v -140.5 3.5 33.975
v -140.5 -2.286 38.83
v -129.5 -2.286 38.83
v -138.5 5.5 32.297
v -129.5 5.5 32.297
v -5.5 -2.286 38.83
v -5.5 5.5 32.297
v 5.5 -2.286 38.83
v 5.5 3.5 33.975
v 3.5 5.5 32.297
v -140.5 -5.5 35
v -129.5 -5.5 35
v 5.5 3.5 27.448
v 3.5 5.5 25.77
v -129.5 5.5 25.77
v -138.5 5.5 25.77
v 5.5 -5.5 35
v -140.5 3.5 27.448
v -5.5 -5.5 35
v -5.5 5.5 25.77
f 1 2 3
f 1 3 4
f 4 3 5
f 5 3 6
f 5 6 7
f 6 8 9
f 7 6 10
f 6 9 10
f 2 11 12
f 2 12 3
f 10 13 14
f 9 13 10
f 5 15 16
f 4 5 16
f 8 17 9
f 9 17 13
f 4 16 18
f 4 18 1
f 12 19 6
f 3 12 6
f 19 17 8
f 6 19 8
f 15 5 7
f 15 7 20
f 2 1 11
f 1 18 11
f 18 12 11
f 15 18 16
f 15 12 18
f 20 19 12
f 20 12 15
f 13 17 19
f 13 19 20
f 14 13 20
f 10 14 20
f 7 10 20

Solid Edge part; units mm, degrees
sketch "Sketch1" plane through (0, 0, 0) normal (0, 0, 1) x (1, 0, 0)
  line L0 (-140.5, -5.5) -> (-129.5, -5.5)
  line L1 (-129.5, -5.5) -> (-129.5, 5.5)
  line L2 (-129.5, 5.5) -> (-140.5, 5.5)
  line L3 (-140.5, 5.5) -> (-140.5, -5.5)
  line L4 (-5.5, -5.5) -> (5.5, -5.5)
  line L5 (5.5, -5.5) -> (5.5, 5.5)
  line L6 (5.5, 5.5) -> (-5.5, 5.5)
  line L7 (-5.5, 5.5) -> (-5.5, -5.5)
extrude "ExtrudedProtrusion_1" add sketch "Sketch1" along normal blind 35
sketch "Sketch2" plane through (-129.5, 0, 17.5) normal (1, 0, 0) x (0, 1, 0)
  line L0 (-5.5, 17.5) -> (5.5, 8.2699)
  line L1 (5.5, 8.2699) -> (8.7139, 12.1001)
  line L2 (-2.2861, 21.3302) -> (8.7139, 12.1001)
  line L3 (-5.5, 17.5) -> (-2.2861, 21.3302)
extrude "Protrusion1" add sketch "Sketch2" along normal up to vertex (124 mm away)
sketch "Sketch3" plane through (-135, 0, 35) normal (0, 0, 1) x (1, 0, 0)
  line L0 (5.5, -5.5) -> (-5.5, -5.5)
  line L1 (-5.5, -5.5) -> (-5.5, 5.5)
  line L2 (-5.5, 5.5) -> (5.5, 5.5)
  line L3 (5.5, 5.5) -> (5.5, -5.5)
  line L4 (140.5, -5.5) -> (129.5, -5.5)
  line L5 (129.5, -5.5) -> (129.5, 5.5)
  line L6 (129.5, 5.5) -> (140.5, 5.5)
  line L7 (140.5, 5.5) -> (140.5, -5.5)
extrude "Protrusion2" add sketch "Sketch3" along normal up to vertex (3.8302 mm away)
sketch "Sketch4" plane through (-129.5, 0, 17.5) normal (1, 0, 0) x (0, 1, 0)
  line L0 (8.7139, 12.1001) -> (-2.2861, 21.3302)
  line L1 (-5.5, 17.5) -> (-2.2861, 21.3302)
  line L2 (5.5, 8.2699) -> (-5.5, 17.5)
extrude "ExtrudedCutout_1" cut sketch "Sketch4" against normal blind 22.2856 and the other way blind 177.6733 material side at (-129.5, 3.246, 34.2535)
sketch "Sketch5" plane through (-129.5, -3.893, 36.9151) normal (1, 0, 0) x (0, 1, 0)
  line L0 (-1.607, 1.9151) -> (-1.607, -1.9151)
  line L1 (-1.607, -1.9151) -> (1.607, 1.9151)
  line L2 (1.607, 1.9151) -> (-1.607, 1.9151)
extrude "Protrusion3" add sketch "Sketch5" along normal up to vertex (124 mm away)
sketch "Sketch6" plane through (-5.5, 7.107, 29.0334) normal (1, 0, 0) x (0, 0.7660444, -0.6427876)
  line L0 (-3.3288, 1.4671) -> (0.8667, -3.5329)
  line L1 (0.8667, -3.5329) -> (0.8667, 1.4671)
  line L2 (0.8667, 1.4671) -> (-3.3288, 1.4671)
extrude "ExtrudedCutout_2" cut sketch "Sketch6" against normal blind 148.825
chamfer "Chamfer_1" distance 2 angle 45 2 edges at (5.5, 5.5, 29.0334) (-140.5, 5.5, 29.0334)
sketch "Sketch7" plane through (-5.5, -3.893, 36.9151) normal (1, 0, 0) x (0, 1, 0)
  line L0 (-1.607, 1.9151) -> (-1.607, -1.9151)
  line L1 (-1.607, -1.9151) -> (1.607, 1.9151)
  line L2 (1.607, 1.9151) -> (-1.607, 1.9151)
extrude "ExtrudedCutout_3" cut sketch "Sketch7" against normal blind 147.0502
